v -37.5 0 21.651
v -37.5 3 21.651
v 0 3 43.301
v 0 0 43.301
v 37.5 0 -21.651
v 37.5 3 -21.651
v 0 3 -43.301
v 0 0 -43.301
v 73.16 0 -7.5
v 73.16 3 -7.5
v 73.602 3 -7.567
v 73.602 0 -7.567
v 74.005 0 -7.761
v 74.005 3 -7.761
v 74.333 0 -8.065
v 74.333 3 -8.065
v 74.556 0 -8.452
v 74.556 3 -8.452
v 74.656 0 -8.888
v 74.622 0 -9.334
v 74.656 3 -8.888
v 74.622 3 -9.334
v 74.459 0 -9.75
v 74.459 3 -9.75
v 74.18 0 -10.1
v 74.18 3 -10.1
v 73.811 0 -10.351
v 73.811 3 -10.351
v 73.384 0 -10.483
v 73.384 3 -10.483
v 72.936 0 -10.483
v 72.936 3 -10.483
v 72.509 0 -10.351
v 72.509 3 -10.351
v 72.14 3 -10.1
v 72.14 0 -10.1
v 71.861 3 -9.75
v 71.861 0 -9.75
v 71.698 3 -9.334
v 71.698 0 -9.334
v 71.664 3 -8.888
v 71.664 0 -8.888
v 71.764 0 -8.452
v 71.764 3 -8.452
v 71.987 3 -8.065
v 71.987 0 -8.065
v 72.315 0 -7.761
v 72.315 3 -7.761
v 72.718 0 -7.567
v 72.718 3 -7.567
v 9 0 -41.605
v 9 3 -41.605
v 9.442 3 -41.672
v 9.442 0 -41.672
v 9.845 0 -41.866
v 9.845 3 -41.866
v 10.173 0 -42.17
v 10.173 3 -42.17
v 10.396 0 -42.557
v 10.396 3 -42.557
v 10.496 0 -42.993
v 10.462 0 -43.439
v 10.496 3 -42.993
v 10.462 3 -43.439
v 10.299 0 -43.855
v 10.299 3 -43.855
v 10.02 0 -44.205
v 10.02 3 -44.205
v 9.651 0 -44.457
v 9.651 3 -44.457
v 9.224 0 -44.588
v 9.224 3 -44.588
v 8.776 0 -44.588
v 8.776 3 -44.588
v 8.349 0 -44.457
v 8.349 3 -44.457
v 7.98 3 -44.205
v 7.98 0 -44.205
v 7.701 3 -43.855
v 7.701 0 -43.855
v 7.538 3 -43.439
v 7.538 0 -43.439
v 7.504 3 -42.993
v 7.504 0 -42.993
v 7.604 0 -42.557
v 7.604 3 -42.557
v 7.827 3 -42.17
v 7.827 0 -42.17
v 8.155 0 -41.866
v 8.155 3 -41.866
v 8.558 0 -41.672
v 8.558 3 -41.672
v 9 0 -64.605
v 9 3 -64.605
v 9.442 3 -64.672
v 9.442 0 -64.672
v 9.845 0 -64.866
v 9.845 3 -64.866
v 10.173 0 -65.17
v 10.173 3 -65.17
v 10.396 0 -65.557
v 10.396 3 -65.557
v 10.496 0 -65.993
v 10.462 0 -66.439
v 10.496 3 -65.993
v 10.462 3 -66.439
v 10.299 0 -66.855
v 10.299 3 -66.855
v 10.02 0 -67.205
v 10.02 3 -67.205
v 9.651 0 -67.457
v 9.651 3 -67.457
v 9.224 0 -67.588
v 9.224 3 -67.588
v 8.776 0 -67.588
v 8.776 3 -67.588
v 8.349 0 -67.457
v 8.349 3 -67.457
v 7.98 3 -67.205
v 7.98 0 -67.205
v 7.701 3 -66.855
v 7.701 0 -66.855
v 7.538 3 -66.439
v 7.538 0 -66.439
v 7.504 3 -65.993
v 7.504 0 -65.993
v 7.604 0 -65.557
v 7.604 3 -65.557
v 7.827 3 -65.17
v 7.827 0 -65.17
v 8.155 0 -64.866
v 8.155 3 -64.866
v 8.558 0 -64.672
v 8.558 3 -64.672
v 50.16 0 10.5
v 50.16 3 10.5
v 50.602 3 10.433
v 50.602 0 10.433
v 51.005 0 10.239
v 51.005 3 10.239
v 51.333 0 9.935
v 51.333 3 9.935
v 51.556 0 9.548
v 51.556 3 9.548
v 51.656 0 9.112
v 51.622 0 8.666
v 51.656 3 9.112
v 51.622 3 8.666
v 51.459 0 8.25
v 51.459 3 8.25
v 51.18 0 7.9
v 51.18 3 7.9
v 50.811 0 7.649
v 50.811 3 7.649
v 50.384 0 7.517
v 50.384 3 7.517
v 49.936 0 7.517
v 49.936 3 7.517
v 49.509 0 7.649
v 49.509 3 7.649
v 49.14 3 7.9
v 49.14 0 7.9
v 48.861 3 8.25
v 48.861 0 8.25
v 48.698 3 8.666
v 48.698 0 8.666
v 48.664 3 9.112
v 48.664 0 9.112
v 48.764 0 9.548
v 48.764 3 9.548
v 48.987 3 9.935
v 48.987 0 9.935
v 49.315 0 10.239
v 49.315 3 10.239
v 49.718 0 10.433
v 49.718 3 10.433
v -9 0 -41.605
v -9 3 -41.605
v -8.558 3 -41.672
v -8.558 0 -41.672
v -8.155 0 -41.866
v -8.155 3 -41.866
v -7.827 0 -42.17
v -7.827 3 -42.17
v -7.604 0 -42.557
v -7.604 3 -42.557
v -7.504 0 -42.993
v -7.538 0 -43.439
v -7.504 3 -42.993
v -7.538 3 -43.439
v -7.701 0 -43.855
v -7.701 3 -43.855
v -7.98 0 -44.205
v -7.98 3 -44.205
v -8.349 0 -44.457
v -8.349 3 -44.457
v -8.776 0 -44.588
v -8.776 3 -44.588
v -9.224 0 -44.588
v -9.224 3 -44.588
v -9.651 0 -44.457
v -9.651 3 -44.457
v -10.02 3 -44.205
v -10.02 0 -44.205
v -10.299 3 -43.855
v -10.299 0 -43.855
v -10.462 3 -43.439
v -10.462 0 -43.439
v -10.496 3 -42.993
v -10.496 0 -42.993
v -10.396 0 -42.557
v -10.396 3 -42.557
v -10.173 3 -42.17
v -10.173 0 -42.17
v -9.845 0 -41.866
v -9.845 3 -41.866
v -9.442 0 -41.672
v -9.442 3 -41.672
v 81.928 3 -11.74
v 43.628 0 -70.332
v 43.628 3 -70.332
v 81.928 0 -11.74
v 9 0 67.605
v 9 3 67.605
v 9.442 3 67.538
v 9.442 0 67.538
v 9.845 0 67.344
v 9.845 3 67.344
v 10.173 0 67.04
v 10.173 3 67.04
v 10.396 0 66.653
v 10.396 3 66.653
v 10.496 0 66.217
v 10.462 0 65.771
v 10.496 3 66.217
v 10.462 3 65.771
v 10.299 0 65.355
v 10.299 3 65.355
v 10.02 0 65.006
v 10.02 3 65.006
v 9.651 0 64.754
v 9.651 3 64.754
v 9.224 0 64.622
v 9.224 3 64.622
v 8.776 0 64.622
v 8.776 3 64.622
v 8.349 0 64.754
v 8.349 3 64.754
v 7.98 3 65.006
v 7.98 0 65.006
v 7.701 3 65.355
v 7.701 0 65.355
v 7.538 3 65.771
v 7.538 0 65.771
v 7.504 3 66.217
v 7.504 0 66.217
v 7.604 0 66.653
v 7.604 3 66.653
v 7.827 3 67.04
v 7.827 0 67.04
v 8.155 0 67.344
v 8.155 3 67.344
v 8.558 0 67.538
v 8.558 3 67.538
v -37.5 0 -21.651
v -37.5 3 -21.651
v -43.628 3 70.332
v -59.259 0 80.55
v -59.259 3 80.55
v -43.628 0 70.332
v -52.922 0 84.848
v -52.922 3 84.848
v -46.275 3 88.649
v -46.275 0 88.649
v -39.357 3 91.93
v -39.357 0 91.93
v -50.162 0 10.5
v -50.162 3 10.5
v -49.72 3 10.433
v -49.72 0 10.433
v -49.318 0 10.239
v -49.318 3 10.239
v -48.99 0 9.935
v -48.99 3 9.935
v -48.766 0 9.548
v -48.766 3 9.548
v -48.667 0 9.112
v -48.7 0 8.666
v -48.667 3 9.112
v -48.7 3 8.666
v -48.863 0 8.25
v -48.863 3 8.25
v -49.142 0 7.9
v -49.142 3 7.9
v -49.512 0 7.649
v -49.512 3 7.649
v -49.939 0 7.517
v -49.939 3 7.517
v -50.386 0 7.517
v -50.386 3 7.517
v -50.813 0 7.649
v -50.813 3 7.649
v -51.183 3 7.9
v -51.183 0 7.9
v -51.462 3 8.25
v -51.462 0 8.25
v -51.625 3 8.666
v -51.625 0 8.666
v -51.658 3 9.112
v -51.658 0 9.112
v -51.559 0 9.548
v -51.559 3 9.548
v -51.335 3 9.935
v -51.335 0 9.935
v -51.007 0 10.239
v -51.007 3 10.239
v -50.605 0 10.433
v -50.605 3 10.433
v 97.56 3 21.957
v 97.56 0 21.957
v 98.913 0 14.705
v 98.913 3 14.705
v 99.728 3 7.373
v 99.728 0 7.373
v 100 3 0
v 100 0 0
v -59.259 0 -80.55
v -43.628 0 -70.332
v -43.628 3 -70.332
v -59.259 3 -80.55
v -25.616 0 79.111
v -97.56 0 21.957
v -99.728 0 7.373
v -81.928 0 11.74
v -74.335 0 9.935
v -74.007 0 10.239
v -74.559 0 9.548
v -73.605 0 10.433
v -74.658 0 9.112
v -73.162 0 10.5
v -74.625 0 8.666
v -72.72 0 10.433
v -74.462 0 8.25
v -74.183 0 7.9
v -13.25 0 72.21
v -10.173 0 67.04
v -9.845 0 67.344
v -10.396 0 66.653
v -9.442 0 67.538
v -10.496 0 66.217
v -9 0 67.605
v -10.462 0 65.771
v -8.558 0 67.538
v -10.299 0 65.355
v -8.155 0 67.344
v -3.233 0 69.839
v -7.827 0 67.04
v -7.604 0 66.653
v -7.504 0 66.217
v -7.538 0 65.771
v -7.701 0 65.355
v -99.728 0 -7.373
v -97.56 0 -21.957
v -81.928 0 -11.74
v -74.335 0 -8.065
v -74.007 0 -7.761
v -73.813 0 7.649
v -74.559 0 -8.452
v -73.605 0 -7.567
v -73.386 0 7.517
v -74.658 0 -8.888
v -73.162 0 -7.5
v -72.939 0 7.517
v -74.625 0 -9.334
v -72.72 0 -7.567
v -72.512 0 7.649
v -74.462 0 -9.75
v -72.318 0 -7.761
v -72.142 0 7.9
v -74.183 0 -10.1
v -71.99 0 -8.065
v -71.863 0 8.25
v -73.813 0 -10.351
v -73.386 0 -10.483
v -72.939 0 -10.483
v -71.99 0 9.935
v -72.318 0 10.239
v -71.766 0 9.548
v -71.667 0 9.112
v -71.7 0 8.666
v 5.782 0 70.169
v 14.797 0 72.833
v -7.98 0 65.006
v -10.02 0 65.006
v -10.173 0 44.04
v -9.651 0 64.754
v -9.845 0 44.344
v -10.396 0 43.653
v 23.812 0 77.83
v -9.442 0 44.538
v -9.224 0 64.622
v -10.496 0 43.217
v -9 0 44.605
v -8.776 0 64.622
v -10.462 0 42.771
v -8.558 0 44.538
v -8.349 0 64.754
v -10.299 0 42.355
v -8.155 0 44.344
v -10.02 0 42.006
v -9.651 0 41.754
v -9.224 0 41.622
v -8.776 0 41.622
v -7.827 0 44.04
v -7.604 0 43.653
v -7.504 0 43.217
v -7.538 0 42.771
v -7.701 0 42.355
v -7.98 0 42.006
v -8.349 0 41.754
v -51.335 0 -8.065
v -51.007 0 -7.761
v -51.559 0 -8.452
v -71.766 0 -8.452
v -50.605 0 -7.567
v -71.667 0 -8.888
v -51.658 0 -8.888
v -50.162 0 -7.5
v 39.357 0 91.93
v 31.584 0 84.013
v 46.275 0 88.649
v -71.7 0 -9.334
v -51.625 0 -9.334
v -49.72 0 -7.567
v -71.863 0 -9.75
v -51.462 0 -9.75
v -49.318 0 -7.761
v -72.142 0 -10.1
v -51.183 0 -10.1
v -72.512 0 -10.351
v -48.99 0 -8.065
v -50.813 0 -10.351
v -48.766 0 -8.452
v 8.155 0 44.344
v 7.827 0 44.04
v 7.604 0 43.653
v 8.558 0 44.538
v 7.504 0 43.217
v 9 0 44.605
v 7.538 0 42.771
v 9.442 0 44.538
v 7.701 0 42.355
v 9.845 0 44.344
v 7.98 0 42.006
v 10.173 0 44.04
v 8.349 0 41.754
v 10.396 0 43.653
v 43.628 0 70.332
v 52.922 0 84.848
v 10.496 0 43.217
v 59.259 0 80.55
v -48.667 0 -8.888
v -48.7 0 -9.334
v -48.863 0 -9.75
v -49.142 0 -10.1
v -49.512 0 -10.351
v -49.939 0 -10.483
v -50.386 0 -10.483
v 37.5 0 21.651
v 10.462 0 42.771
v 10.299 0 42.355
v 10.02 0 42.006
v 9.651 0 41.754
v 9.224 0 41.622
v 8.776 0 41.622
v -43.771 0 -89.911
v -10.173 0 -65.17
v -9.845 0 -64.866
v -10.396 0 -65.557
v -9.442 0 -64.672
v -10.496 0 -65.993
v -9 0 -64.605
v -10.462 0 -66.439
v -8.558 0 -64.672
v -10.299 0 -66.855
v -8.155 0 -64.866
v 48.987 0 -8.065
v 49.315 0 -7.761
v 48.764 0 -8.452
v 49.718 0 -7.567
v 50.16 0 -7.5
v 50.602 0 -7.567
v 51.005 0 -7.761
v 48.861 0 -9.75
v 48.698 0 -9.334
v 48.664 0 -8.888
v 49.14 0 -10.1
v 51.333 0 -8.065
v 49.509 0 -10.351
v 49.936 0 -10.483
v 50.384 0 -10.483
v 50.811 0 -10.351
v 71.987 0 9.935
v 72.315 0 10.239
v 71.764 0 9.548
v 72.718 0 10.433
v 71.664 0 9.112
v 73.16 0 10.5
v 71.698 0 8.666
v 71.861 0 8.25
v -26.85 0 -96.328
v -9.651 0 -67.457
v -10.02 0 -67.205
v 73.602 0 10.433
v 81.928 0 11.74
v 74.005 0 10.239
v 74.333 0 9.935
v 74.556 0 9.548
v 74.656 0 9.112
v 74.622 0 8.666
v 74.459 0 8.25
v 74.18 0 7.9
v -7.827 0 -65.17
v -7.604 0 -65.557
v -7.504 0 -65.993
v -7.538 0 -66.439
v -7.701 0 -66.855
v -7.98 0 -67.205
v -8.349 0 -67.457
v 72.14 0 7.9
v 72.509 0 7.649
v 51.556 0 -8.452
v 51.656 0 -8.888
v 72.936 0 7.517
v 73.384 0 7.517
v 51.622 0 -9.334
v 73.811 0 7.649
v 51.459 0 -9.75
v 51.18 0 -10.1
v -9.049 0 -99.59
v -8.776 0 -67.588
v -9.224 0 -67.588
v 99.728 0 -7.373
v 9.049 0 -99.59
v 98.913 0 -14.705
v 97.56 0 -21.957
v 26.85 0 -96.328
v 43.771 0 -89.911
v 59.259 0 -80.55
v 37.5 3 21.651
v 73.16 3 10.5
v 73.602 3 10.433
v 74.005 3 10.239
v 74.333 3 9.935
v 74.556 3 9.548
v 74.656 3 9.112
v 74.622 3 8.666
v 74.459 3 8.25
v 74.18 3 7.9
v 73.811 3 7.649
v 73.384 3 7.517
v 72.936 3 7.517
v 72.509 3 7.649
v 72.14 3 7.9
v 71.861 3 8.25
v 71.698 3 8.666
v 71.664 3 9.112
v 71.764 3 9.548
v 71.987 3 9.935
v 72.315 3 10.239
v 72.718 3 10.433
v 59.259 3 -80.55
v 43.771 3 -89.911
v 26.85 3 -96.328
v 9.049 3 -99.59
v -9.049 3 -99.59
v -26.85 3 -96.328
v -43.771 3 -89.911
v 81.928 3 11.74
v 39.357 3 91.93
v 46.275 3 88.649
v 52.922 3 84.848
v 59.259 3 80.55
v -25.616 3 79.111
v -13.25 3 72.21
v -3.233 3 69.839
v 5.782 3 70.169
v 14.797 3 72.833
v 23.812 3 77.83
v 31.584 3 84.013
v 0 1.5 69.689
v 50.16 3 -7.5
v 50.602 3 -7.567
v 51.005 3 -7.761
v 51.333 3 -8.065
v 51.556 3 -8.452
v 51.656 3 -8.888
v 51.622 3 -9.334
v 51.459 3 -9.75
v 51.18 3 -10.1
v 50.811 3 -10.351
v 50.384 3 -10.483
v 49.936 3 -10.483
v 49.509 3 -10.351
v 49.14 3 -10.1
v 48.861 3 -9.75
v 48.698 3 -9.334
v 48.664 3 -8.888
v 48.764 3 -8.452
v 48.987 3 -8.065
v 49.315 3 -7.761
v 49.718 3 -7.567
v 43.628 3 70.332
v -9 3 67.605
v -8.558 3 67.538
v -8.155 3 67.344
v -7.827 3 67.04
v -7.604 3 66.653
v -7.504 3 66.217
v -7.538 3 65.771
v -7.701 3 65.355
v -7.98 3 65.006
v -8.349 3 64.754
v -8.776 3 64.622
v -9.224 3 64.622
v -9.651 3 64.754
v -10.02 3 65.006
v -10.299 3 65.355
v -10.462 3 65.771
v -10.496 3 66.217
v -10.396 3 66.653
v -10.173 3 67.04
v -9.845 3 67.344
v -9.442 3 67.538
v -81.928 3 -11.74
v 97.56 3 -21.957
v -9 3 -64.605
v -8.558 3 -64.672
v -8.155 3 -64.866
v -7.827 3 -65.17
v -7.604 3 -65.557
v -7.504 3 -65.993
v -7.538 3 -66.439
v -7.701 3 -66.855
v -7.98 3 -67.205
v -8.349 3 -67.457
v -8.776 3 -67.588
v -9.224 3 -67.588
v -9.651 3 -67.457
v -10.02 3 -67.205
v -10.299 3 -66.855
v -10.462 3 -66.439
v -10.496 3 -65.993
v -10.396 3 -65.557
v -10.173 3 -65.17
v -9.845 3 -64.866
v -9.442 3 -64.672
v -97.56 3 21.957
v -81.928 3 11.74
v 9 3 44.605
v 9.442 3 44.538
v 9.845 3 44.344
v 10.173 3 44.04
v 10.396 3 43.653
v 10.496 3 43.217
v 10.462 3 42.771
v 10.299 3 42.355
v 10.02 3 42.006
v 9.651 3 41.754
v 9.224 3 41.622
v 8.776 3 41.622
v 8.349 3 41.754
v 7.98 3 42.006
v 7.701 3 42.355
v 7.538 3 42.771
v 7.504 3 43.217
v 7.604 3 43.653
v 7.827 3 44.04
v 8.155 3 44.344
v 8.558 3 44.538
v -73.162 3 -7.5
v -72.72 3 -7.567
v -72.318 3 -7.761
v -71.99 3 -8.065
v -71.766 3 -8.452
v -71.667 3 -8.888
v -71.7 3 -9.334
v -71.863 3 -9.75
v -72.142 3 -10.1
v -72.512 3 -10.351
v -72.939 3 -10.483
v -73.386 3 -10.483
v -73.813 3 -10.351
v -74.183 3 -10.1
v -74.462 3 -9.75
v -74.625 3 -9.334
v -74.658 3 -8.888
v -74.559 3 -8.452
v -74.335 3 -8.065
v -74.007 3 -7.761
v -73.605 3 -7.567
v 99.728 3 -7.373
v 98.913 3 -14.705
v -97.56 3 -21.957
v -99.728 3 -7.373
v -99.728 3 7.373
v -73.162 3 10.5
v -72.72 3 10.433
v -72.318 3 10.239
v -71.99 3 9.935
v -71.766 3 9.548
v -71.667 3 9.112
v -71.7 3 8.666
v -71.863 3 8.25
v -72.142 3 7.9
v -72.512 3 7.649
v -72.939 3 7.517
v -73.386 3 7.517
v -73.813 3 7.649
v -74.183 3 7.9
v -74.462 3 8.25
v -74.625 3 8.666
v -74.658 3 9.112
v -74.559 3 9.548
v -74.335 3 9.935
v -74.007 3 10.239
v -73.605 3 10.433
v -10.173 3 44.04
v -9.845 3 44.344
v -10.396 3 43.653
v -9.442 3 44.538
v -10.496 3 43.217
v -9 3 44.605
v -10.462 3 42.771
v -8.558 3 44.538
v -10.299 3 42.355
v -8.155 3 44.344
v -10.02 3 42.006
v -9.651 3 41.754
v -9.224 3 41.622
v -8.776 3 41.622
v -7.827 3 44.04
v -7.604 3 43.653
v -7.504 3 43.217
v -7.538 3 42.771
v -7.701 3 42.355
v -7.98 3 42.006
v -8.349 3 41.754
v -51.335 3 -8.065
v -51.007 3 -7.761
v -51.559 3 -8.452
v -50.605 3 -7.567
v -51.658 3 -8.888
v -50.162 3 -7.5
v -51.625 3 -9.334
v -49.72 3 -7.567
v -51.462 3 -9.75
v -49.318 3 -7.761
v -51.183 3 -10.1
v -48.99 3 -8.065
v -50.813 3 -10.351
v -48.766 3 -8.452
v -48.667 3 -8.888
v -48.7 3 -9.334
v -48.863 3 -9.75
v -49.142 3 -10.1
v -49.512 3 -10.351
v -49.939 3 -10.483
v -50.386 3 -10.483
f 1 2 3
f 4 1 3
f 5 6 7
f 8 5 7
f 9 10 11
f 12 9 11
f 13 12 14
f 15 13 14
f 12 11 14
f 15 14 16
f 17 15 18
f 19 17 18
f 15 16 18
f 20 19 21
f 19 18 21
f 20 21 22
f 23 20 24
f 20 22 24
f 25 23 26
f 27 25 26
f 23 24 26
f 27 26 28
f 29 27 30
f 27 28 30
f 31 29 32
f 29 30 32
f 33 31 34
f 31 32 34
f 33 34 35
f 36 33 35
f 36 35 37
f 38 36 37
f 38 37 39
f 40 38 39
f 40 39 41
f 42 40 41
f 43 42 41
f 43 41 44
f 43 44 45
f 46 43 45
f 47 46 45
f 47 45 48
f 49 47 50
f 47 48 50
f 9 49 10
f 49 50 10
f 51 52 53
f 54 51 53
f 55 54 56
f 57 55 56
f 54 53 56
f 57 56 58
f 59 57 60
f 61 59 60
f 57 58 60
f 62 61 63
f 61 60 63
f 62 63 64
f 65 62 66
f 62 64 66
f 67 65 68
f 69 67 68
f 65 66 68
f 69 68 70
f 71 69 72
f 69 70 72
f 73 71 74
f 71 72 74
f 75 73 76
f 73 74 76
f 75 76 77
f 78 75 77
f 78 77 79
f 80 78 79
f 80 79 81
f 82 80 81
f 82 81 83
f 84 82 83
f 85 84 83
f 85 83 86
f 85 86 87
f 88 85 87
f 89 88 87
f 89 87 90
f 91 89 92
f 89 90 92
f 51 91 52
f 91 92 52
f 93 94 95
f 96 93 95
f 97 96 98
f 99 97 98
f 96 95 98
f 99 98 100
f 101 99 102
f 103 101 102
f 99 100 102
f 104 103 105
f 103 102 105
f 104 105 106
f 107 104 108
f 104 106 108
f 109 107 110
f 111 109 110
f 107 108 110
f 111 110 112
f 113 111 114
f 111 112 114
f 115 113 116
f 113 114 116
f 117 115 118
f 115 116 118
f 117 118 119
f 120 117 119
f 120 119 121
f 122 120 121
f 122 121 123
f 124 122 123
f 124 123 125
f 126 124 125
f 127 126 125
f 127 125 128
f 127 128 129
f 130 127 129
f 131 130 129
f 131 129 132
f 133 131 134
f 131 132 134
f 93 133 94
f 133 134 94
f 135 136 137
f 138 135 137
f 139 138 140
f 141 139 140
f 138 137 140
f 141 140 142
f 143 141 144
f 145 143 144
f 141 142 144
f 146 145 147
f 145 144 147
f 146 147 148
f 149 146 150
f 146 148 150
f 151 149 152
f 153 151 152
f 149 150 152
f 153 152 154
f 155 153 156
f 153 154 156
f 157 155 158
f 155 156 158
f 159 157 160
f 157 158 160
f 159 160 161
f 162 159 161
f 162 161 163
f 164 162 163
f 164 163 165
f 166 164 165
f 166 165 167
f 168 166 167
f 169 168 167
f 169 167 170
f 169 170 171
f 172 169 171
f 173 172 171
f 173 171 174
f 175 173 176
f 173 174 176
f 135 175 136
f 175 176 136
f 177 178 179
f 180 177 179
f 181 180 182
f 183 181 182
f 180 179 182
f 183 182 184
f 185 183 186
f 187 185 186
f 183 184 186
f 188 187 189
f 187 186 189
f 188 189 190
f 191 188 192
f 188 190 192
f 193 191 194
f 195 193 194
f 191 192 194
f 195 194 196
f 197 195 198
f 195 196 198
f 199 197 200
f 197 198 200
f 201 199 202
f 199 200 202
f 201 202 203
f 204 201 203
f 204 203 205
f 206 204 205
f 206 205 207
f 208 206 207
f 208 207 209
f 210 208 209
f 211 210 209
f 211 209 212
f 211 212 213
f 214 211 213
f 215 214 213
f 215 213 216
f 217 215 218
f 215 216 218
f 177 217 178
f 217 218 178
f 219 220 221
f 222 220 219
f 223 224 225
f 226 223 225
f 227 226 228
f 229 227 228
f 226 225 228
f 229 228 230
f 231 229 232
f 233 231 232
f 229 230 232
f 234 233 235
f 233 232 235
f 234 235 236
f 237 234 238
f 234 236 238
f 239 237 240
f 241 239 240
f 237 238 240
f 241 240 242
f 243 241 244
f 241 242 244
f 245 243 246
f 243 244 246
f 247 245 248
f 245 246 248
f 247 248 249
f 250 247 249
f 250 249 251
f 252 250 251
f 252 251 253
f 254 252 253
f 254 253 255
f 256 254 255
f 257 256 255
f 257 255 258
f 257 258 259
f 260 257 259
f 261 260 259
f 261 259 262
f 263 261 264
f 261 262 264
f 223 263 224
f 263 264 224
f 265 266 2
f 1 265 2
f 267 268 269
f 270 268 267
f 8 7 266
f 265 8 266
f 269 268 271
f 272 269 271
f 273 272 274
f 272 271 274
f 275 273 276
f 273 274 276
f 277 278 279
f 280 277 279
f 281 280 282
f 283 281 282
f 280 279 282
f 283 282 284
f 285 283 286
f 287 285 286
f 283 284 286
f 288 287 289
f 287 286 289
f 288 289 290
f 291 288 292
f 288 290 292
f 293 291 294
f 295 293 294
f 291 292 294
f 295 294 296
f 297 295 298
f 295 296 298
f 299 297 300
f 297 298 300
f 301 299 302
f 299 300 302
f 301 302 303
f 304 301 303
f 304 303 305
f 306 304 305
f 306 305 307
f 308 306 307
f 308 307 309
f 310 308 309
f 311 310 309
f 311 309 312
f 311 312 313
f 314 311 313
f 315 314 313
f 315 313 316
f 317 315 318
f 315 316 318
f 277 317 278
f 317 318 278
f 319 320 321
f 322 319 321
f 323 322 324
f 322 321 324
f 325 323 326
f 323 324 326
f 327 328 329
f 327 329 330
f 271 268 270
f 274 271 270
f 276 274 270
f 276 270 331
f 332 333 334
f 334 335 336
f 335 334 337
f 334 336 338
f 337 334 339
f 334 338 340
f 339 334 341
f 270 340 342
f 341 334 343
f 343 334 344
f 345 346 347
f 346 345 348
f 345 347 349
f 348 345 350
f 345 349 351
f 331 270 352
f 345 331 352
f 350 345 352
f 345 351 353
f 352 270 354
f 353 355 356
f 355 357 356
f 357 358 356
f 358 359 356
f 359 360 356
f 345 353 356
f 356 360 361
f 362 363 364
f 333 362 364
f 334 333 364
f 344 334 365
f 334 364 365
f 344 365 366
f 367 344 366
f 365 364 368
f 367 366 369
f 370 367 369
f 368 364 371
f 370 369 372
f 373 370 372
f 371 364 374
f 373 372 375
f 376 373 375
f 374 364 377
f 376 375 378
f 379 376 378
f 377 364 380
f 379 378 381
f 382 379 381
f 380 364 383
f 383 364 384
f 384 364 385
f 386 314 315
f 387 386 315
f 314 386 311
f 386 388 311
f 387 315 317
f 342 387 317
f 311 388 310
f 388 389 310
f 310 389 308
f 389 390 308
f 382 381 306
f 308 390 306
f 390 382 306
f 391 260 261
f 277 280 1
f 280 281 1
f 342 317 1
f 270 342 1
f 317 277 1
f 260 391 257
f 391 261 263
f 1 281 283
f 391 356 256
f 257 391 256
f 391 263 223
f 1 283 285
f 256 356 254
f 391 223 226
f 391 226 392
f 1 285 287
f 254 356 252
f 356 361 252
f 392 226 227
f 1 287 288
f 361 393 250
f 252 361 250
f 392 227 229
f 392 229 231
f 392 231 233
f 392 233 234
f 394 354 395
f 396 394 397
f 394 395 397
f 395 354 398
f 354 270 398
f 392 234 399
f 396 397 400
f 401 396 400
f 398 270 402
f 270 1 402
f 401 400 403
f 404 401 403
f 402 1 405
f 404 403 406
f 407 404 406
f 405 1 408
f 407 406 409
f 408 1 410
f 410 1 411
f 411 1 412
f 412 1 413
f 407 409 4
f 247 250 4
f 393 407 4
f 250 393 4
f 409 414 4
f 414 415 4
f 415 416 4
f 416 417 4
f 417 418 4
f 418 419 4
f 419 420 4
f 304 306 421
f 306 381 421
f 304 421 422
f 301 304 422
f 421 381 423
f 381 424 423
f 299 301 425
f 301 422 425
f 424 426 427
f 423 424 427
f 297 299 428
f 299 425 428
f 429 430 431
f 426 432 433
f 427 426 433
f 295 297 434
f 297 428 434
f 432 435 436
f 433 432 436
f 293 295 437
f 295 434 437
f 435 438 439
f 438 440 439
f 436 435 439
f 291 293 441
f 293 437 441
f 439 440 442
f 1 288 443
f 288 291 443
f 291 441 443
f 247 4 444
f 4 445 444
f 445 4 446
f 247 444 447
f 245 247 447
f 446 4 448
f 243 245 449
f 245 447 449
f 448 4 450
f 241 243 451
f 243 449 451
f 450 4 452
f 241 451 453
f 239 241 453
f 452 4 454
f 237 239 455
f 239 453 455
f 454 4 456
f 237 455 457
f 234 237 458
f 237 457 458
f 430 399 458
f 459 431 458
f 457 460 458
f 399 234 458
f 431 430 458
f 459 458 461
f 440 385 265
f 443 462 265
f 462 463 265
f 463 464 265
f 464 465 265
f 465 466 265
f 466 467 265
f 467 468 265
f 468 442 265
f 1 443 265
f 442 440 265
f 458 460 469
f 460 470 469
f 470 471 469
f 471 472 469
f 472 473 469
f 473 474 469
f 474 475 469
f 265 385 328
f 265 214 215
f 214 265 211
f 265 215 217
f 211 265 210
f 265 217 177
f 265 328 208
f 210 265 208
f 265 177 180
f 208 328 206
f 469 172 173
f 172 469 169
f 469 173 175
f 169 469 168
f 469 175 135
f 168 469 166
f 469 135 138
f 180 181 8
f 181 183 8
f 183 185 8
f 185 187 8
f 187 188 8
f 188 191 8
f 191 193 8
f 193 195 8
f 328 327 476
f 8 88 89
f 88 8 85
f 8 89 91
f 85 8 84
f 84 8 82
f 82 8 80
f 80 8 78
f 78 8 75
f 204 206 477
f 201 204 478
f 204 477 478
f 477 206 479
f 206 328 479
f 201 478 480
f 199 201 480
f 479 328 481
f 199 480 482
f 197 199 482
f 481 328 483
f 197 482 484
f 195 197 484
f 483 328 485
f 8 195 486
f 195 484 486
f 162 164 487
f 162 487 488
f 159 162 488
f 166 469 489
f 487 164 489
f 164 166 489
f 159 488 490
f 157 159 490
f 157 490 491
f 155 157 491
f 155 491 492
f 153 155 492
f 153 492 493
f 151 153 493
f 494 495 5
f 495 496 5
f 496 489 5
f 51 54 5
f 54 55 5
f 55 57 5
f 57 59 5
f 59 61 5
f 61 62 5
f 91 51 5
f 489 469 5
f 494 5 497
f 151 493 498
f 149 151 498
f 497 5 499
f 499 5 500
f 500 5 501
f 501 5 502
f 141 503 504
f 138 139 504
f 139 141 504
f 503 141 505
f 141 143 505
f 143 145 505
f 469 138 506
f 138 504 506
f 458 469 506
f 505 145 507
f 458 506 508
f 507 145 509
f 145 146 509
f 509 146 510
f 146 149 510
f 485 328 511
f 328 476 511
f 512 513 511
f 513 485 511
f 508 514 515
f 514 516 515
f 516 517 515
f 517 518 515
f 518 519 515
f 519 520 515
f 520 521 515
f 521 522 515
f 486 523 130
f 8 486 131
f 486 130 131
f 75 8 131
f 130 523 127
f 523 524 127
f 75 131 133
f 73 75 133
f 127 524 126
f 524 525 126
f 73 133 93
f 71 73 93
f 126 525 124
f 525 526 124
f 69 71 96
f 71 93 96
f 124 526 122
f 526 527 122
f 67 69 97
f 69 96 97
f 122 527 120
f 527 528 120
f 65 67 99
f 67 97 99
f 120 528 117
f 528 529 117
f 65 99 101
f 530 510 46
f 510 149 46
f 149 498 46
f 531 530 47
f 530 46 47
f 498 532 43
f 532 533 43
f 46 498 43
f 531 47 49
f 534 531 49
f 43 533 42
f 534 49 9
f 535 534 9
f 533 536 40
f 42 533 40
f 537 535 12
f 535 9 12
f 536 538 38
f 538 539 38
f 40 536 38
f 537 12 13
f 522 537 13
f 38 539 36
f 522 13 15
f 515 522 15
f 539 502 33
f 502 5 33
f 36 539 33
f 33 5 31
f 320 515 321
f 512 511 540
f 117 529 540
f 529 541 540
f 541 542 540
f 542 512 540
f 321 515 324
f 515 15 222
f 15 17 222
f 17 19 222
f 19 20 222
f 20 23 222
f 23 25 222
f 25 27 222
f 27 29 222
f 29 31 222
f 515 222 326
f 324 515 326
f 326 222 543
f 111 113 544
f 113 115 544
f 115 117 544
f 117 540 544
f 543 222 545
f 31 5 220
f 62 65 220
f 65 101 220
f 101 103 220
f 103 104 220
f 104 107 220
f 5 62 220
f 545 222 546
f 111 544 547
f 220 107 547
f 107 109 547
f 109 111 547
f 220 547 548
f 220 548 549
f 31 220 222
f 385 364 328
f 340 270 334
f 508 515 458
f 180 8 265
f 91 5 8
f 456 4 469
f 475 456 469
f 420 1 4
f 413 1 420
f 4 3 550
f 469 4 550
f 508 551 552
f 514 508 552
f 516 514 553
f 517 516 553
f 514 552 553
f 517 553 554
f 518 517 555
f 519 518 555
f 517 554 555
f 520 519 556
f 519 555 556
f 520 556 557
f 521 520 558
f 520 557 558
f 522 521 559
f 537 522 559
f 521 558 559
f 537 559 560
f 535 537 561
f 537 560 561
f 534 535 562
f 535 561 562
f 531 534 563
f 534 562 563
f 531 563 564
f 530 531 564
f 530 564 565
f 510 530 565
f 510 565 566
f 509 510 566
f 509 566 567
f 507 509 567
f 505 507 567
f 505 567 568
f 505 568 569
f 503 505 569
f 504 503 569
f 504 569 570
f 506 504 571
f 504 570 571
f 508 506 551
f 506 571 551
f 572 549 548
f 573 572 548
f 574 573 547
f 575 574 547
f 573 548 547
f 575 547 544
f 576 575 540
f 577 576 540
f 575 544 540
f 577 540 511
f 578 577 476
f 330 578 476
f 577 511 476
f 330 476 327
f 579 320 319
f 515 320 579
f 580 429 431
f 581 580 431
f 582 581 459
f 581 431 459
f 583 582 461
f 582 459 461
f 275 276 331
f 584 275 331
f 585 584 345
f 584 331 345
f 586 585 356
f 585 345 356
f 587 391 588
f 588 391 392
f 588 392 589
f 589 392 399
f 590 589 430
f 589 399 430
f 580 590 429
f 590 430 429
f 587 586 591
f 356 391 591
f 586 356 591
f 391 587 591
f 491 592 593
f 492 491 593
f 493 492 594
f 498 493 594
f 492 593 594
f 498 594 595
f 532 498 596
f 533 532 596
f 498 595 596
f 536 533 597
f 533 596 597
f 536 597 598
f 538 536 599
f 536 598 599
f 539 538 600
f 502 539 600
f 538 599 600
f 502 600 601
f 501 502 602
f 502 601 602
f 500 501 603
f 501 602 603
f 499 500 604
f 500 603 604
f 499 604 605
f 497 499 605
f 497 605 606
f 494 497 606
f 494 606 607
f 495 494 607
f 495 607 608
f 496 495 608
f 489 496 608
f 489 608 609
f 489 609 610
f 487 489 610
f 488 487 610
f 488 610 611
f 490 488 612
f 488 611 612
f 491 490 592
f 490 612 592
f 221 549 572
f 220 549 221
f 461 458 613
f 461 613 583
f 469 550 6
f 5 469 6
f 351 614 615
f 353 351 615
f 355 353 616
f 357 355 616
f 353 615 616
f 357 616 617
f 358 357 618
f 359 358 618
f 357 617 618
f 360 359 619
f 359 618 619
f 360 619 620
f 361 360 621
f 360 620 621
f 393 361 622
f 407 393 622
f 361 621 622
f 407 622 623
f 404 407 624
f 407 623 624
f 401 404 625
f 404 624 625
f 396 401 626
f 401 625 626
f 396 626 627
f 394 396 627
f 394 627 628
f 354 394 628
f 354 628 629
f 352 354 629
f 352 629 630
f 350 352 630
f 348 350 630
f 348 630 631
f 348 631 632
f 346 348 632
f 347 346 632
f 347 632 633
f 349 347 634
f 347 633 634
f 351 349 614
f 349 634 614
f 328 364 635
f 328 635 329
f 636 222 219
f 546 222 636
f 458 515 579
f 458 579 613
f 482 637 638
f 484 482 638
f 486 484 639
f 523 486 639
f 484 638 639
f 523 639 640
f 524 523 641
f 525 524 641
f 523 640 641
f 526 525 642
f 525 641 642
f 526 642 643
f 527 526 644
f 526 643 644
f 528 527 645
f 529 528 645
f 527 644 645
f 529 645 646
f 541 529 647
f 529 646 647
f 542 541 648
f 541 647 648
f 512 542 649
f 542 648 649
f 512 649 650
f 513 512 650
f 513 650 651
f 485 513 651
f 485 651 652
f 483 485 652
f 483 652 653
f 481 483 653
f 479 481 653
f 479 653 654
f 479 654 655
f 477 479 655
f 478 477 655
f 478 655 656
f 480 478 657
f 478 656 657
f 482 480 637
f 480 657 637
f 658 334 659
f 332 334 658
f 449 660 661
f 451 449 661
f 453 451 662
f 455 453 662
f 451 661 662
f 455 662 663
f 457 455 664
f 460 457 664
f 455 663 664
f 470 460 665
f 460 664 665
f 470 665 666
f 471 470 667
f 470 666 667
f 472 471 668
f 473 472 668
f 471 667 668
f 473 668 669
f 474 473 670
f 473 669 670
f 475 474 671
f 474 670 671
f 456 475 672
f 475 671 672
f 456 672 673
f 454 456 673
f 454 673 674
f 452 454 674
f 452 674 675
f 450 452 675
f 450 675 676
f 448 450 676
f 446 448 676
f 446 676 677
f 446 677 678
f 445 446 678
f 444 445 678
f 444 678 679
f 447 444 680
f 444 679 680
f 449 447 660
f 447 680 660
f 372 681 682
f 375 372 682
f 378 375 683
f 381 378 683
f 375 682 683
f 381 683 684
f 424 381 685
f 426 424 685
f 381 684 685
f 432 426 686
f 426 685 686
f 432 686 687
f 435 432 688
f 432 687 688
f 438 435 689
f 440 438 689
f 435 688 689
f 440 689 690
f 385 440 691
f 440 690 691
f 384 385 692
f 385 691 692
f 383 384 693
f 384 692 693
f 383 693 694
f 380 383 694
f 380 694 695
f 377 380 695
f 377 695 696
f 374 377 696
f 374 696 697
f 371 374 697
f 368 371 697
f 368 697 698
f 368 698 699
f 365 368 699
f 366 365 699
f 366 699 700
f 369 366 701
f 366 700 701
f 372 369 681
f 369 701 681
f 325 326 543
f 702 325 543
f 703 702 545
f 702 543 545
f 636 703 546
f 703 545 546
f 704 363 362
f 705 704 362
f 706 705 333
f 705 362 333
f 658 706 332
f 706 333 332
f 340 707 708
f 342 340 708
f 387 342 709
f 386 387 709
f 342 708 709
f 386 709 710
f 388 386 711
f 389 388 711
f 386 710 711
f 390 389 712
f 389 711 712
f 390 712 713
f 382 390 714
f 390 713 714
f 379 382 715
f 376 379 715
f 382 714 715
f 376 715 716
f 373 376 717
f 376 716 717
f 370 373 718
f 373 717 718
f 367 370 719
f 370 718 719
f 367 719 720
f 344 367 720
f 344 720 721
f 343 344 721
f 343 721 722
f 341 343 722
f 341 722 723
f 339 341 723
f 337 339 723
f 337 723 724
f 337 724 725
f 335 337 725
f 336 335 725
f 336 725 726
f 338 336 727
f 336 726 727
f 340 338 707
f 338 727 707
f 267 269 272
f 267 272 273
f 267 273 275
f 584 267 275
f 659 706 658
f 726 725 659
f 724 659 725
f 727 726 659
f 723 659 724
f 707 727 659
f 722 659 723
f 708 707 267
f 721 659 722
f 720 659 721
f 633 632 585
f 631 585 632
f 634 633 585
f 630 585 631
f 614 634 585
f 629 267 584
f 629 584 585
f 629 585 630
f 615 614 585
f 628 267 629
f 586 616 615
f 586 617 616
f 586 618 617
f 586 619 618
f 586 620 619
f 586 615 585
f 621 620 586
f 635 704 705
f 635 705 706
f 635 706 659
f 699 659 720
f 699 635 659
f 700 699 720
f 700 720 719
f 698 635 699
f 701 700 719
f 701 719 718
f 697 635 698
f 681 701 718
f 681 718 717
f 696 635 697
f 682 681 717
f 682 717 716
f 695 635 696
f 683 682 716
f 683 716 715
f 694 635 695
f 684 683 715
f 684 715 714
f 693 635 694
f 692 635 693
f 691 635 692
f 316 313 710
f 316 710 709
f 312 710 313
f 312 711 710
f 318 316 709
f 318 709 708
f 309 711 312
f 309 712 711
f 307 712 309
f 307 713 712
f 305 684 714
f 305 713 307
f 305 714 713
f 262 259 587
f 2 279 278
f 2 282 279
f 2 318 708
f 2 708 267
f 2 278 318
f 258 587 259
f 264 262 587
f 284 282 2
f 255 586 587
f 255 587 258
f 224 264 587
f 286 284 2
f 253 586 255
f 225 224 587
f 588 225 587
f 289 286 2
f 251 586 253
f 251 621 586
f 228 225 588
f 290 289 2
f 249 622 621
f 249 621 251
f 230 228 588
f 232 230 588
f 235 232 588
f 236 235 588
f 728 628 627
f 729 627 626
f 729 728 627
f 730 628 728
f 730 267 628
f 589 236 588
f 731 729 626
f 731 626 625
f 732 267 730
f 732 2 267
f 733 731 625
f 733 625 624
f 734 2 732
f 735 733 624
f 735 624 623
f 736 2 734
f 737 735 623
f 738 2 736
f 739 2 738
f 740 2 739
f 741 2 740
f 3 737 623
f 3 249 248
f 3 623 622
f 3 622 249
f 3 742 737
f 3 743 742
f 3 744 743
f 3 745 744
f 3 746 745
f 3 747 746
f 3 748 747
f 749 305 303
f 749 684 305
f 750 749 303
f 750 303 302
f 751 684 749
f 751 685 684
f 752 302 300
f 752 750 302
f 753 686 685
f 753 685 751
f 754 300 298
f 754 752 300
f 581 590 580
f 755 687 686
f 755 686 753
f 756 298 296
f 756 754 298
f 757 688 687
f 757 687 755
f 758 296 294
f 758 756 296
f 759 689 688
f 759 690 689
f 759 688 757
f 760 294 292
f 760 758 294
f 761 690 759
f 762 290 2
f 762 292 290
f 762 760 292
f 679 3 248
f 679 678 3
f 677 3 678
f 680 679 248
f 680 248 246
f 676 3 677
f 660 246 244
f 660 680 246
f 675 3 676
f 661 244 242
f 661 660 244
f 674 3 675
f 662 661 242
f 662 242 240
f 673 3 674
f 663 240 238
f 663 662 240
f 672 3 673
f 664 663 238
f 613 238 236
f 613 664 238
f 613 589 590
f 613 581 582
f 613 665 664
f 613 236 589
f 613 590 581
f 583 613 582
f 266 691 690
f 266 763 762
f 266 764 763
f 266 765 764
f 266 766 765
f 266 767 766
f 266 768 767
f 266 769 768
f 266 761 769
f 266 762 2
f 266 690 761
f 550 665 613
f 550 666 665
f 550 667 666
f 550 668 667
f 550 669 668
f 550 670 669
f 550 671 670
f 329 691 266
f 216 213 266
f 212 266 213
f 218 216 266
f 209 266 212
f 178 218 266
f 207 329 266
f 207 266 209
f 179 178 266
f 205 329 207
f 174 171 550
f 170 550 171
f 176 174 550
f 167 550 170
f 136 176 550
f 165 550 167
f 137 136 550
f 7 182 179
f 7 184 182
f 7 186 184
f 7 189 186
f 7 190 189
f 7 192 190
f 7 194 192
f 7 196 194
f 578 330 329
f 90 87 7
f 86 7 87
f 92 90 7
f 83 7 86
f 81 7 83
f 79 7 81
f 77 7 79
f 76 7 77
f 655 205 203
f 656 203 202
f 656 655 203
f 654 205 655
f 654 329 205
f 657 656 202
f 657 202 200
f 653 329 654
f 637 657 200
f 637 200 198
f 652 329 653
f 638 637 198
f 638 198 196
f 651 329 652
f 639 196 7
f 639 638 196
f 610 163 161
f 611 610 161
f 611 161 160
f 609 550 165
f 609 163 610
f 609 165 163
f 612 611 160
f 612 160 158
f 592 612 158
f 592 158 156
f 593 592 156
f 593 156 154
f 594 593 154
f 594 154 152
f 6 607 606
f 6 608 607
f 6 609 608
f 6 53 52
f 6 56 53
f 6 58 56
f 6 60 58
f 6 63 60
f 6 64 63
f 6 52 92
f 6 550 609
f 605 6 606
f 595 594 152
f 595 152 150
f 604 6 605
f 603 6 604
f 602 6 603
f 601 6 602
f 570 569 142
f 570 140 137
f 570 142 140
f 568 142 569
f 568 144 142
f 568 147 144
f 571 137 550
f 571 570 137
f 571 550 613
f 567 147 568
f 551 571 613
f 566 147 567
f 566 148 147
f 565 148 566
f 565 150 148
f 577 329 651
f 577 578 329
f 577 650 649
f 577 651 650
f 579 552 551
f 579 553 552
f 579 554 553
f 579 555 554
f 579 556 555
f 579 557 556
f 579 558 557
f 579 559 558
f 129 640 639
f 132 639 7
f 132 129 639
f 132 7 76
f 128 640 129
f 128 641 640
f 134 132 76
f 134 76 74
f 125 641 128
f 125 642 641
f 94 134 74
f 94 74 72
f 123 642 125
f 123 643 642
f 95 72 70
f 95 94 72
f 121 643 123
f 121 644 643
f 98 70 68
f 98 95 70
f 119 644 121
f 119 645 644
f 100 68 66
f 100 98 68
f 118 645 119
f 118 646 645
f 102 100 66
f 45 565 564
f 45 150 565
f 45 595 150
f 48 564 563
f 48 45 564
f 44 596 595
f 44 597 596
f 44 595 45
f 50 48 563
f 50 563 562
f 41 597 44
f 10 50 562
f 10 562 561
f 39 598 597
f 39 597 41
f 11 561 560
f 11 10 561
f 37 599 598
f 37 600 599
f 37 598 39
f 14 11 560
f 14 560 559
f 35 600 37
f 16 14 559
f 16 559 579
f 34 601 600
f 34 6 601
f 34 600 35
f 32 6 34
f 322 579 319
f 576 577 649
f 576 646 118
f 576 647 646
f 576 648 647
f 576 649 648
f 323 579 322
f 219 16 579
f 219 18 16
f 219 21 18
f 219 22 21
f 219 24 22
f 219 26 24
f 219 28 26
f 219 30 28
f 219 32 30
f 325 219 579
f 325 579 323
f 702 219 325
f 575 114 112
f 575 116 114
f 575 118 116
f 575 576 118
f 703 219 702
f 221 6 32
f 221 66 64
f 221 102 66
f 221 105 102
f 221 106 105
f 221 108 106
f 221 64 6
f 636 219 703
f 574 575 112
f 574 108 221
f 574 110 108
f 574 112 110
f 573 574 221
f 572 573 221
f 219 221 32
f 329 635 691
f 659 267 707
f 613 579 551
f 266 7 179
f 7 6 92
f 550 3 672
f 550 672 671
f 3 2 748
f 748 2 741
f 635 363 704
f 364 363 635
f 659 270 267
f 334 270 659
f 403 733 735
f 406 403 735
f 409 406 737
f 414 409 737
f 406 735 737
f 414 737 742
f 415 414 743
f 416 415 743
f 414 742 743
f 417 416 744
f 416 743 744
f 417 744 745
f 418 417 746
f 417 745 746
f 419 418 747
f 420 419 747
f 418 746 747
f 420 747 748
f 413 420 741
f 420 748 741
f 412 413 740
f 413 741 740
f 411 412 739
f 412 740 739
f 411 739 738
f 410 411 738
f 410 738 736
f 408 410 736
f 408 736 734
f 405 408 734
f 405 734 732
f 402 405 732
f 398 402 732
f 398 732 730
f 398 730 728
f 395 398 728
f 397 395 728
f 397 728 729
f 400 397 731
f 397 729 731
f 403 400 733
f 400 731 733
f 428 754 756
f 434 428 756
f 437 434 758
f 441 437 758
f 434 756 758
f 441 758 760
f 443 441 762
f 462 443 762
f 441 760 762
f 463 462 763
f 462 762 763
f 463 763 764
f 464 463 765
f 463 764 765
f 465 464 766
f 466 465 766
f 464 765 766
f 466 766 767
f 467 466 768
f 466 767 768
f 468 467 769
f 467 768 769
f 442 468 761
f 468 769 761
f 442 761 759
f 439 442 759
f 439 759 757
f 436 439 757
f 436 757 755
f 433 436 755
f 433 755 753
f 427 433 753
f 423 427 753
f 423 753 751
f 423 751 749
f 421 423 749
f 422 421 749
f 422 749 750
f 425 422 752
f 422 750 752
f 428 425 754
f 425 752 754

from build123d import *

# Parameters (mm, degrees)
BOSS_EXTRUDE1_DEPTH = 3
CUT_EXTRUDE1_START  = -3
CUT_EXTRUDE1_DEPTH  = 3
CUT_EXTRUDE2_DEPTH  = 3
SKETCH5_R           = 1.5
CUT_EXTRUDE4_DEPTH  = 3


with BuildPart() as part:
    # Sketch2 → Boss-Extrude1 (new body)
    with BuildSketch(Plane(origin=(0, 0, 0), x_dir=(1, 0, 0), z_dir=(0, 1, 0))):
        with BuildLine():
            ThreePointArc((100, 0), (-55.065067857, 83.473578466), (-39.356766037, -91.92956525))
            add(Edge.make_bspline(
                [(-39.356766037, -91.92956525), (-19.678383019, -69.689240506), (0, -69.689240506)],
                knots=[0, 0, 0, 0.5, 0.5, 0.5], degree=2))
            add(Edge.make_bspline(
                [(0, -69.689240506), (19.678383019, -69.689240506), (39.356766037, -91.92956525)],
                knots=[0.5, 0.5, 0.5, 1, 1, 1], degree=2))
            ThreePointArc((39.356766037, -91.92956525), (83.473578466, -55.065067857), (100, 0))
        make_face()
    extrude(amount=BOSS_EXTRUDE1_DEPTH)

    # Sketch3 → Cut-Extrude1 (cut)
    with BuildSketch(Plane(origin=(0, 3, 0), x_dir=(1, 0, 0), z_dir=(0, 1, 0)).offset(CUT_EXTRUDE1_START)):
        with BuildLine():
            ThreePointArc((-83.703770268, 54.714521317), (-92.099700567, 38.95696543), (-97.559564128, 21.957491822))
            Line((-97.559564128, 21.957491822), (-81.927910162, 11.739571394))
            Line((-81.927910162, 11.739571394), (-43.62774524, 70.332210581))
            Line((-43.62774524, 70.332210581), (-59.259399207, 80.55013101))
            ThreePointArc((-59.259399207, 80.55013101), (-72.639428953, 68.727820869), (-83.703770268, 54.714521317))
        make_face()
        with BuildLine():
            ThreePointArc((83.703770268, 54.714521317), (72.639428953, 68.727820869), (59.259399207, 80.55013101))
            Line((59.259399207, 80.55013101), (43.62774524, 70.332210581))
            Line((43.62774524, 70.332210581), (81.927910162, 11.739571394))
            Line((81.927910162, 11.739571394), (97.559564128, 21.957491822))
            ThreePointArc((97.559564128, 21.957491822), (92.099700567, 38.95696543), (83.703770268, 54.714521317))
        make_face()
        with BuildLine():
            ThreePointArc((83.703770268, -54.714521317), (92.099700567, -38.95696543), (97.559564128, -21.957491822))
            Line((97.559564128, -21.957491822), (81.927910162, -11.739571394))
            Line((81.927910162, -11.739571394), (43.62774524, -70.332210581))
            Line((43.62774524, -70.332210581), (59.259399207, -80.55013101))
            ThreePointArc((59.259399207, -80.55013101), (72.639428953, -68.727820869), (83.703770268, -54.714521317))
        make_face()
        with BuildLine():
            ThreePointArc((-97.559564128, -21.957491822), (-92.099700567, -38.95696543), (-83.703770268, -54.714521317))
            ThreePointArc((-83.703770268, -54.714521317), (-72.639428953, -68.727820869), (-59.259399207, -80.55013101))
            Line((-59.259399207, -80.55013101), (-43.62774524, -70.332210581))
            Line((-43.62774524, -70.332210581), (-81.927910162, -11.739571394))
            Line((-81.927910162, -11.739571394), (-97.559564128, -21.957491822))
        make_face()
    extrude(amount=CUT_EXTRUDE1_DEPTH, mode=Mode.SUBTRACT)

    # Sketch4 → Cut-Extrude2 (cut)
    with BuildSketch(Plane(origin=(0, 3, 0), x_dir=(1, 0, 0), z_dir=(0, 1, 0))):
        Polygon((0, 43.301270189), (-37.5, 21.650635095), (-37.5, -21.650635095), (0, -43.301270189), (37.5, -21.650635095), (37.5, 21.650635095), align=None)
    extrude(amount=-CUT_EXTRUDE2_DEPTH, mode=Mode.SUBTRACT)

    # Sketch5 → Cut-Extrude4 (cut)
    with BuildSketch(Plane(origin=(0, 3, 0), x_dir=(1, 0, 0), z_dir=(0, 1, 0))):
        with Locations(Location((-73.162499204, 9, 0), (0, 0, 270))):
            Circle(SKETCH5_R)
        with Locations(Location((-73.162499204, -9, 0), (0, 0, 270))):
            Circle(SKETCH5_R)
        with Locations(Location((-50.162499204, -9, 0), (0, 0, 270))):
            Circle(SKETCH5_R)
        with Locations(Location((-50.162499204, 9, 0), (0, 0, 270))):
            Circle(SKETCH5_R)
        with Locations(Location((9, 66.105117767, 0), (0, 0, 270))):
            Circle(SKETCH5_R)
        with Locations(Location((-9, 66.105117767, 0), (0, 0, 270))):
            Circle(SKETCH5_R)
        with Locations(Location((-9, 43.105117767, 0), (0, 0, 270))):
            Circle(SKETCH5_R)
        with Locations(Location((9, 43.105117767, 0), (0, 0, 270))):
            Circle(SKETCH5_R)
        with Locations(Location((73.16, 9, 0), (0, 0, 270))):
            Circle(SKETCH5_R)
        with Locations(Location((50.16, -9, 0), (0, 0, 270))):
            Circle(SKETCH5_R)
        with Locations(Location((9, -43.105117767, 0), (0, 0, 270))):
            Circle(SKETCH5_R)
        with Locations(Location((-9, -43.105117767, 0), (0, 0, 270))):
            Circle(SKETCH5_R)
        with Locations(Location((-9, -66.105117767, 0), (0, 0, 270))):
            Circle(SKETCH5_R)
        with Locations(Location((9, -66.105117767, 0), (0, 0, 270))):
            Circle(SKETCH5_R)
        with Locations(Location((50.16, 9, 0), (0, 0, 270))):
            Circle(SKETCH5_R)
        with Locations(Location((73.16, -9, 0), (0, 0, 270))):
            Circle(SKETCH5_R)
    extrude(amount=-CUT_EXTRUDE4_DEPTH, mode=Mode.SUBTRACT)


solid = part.part
